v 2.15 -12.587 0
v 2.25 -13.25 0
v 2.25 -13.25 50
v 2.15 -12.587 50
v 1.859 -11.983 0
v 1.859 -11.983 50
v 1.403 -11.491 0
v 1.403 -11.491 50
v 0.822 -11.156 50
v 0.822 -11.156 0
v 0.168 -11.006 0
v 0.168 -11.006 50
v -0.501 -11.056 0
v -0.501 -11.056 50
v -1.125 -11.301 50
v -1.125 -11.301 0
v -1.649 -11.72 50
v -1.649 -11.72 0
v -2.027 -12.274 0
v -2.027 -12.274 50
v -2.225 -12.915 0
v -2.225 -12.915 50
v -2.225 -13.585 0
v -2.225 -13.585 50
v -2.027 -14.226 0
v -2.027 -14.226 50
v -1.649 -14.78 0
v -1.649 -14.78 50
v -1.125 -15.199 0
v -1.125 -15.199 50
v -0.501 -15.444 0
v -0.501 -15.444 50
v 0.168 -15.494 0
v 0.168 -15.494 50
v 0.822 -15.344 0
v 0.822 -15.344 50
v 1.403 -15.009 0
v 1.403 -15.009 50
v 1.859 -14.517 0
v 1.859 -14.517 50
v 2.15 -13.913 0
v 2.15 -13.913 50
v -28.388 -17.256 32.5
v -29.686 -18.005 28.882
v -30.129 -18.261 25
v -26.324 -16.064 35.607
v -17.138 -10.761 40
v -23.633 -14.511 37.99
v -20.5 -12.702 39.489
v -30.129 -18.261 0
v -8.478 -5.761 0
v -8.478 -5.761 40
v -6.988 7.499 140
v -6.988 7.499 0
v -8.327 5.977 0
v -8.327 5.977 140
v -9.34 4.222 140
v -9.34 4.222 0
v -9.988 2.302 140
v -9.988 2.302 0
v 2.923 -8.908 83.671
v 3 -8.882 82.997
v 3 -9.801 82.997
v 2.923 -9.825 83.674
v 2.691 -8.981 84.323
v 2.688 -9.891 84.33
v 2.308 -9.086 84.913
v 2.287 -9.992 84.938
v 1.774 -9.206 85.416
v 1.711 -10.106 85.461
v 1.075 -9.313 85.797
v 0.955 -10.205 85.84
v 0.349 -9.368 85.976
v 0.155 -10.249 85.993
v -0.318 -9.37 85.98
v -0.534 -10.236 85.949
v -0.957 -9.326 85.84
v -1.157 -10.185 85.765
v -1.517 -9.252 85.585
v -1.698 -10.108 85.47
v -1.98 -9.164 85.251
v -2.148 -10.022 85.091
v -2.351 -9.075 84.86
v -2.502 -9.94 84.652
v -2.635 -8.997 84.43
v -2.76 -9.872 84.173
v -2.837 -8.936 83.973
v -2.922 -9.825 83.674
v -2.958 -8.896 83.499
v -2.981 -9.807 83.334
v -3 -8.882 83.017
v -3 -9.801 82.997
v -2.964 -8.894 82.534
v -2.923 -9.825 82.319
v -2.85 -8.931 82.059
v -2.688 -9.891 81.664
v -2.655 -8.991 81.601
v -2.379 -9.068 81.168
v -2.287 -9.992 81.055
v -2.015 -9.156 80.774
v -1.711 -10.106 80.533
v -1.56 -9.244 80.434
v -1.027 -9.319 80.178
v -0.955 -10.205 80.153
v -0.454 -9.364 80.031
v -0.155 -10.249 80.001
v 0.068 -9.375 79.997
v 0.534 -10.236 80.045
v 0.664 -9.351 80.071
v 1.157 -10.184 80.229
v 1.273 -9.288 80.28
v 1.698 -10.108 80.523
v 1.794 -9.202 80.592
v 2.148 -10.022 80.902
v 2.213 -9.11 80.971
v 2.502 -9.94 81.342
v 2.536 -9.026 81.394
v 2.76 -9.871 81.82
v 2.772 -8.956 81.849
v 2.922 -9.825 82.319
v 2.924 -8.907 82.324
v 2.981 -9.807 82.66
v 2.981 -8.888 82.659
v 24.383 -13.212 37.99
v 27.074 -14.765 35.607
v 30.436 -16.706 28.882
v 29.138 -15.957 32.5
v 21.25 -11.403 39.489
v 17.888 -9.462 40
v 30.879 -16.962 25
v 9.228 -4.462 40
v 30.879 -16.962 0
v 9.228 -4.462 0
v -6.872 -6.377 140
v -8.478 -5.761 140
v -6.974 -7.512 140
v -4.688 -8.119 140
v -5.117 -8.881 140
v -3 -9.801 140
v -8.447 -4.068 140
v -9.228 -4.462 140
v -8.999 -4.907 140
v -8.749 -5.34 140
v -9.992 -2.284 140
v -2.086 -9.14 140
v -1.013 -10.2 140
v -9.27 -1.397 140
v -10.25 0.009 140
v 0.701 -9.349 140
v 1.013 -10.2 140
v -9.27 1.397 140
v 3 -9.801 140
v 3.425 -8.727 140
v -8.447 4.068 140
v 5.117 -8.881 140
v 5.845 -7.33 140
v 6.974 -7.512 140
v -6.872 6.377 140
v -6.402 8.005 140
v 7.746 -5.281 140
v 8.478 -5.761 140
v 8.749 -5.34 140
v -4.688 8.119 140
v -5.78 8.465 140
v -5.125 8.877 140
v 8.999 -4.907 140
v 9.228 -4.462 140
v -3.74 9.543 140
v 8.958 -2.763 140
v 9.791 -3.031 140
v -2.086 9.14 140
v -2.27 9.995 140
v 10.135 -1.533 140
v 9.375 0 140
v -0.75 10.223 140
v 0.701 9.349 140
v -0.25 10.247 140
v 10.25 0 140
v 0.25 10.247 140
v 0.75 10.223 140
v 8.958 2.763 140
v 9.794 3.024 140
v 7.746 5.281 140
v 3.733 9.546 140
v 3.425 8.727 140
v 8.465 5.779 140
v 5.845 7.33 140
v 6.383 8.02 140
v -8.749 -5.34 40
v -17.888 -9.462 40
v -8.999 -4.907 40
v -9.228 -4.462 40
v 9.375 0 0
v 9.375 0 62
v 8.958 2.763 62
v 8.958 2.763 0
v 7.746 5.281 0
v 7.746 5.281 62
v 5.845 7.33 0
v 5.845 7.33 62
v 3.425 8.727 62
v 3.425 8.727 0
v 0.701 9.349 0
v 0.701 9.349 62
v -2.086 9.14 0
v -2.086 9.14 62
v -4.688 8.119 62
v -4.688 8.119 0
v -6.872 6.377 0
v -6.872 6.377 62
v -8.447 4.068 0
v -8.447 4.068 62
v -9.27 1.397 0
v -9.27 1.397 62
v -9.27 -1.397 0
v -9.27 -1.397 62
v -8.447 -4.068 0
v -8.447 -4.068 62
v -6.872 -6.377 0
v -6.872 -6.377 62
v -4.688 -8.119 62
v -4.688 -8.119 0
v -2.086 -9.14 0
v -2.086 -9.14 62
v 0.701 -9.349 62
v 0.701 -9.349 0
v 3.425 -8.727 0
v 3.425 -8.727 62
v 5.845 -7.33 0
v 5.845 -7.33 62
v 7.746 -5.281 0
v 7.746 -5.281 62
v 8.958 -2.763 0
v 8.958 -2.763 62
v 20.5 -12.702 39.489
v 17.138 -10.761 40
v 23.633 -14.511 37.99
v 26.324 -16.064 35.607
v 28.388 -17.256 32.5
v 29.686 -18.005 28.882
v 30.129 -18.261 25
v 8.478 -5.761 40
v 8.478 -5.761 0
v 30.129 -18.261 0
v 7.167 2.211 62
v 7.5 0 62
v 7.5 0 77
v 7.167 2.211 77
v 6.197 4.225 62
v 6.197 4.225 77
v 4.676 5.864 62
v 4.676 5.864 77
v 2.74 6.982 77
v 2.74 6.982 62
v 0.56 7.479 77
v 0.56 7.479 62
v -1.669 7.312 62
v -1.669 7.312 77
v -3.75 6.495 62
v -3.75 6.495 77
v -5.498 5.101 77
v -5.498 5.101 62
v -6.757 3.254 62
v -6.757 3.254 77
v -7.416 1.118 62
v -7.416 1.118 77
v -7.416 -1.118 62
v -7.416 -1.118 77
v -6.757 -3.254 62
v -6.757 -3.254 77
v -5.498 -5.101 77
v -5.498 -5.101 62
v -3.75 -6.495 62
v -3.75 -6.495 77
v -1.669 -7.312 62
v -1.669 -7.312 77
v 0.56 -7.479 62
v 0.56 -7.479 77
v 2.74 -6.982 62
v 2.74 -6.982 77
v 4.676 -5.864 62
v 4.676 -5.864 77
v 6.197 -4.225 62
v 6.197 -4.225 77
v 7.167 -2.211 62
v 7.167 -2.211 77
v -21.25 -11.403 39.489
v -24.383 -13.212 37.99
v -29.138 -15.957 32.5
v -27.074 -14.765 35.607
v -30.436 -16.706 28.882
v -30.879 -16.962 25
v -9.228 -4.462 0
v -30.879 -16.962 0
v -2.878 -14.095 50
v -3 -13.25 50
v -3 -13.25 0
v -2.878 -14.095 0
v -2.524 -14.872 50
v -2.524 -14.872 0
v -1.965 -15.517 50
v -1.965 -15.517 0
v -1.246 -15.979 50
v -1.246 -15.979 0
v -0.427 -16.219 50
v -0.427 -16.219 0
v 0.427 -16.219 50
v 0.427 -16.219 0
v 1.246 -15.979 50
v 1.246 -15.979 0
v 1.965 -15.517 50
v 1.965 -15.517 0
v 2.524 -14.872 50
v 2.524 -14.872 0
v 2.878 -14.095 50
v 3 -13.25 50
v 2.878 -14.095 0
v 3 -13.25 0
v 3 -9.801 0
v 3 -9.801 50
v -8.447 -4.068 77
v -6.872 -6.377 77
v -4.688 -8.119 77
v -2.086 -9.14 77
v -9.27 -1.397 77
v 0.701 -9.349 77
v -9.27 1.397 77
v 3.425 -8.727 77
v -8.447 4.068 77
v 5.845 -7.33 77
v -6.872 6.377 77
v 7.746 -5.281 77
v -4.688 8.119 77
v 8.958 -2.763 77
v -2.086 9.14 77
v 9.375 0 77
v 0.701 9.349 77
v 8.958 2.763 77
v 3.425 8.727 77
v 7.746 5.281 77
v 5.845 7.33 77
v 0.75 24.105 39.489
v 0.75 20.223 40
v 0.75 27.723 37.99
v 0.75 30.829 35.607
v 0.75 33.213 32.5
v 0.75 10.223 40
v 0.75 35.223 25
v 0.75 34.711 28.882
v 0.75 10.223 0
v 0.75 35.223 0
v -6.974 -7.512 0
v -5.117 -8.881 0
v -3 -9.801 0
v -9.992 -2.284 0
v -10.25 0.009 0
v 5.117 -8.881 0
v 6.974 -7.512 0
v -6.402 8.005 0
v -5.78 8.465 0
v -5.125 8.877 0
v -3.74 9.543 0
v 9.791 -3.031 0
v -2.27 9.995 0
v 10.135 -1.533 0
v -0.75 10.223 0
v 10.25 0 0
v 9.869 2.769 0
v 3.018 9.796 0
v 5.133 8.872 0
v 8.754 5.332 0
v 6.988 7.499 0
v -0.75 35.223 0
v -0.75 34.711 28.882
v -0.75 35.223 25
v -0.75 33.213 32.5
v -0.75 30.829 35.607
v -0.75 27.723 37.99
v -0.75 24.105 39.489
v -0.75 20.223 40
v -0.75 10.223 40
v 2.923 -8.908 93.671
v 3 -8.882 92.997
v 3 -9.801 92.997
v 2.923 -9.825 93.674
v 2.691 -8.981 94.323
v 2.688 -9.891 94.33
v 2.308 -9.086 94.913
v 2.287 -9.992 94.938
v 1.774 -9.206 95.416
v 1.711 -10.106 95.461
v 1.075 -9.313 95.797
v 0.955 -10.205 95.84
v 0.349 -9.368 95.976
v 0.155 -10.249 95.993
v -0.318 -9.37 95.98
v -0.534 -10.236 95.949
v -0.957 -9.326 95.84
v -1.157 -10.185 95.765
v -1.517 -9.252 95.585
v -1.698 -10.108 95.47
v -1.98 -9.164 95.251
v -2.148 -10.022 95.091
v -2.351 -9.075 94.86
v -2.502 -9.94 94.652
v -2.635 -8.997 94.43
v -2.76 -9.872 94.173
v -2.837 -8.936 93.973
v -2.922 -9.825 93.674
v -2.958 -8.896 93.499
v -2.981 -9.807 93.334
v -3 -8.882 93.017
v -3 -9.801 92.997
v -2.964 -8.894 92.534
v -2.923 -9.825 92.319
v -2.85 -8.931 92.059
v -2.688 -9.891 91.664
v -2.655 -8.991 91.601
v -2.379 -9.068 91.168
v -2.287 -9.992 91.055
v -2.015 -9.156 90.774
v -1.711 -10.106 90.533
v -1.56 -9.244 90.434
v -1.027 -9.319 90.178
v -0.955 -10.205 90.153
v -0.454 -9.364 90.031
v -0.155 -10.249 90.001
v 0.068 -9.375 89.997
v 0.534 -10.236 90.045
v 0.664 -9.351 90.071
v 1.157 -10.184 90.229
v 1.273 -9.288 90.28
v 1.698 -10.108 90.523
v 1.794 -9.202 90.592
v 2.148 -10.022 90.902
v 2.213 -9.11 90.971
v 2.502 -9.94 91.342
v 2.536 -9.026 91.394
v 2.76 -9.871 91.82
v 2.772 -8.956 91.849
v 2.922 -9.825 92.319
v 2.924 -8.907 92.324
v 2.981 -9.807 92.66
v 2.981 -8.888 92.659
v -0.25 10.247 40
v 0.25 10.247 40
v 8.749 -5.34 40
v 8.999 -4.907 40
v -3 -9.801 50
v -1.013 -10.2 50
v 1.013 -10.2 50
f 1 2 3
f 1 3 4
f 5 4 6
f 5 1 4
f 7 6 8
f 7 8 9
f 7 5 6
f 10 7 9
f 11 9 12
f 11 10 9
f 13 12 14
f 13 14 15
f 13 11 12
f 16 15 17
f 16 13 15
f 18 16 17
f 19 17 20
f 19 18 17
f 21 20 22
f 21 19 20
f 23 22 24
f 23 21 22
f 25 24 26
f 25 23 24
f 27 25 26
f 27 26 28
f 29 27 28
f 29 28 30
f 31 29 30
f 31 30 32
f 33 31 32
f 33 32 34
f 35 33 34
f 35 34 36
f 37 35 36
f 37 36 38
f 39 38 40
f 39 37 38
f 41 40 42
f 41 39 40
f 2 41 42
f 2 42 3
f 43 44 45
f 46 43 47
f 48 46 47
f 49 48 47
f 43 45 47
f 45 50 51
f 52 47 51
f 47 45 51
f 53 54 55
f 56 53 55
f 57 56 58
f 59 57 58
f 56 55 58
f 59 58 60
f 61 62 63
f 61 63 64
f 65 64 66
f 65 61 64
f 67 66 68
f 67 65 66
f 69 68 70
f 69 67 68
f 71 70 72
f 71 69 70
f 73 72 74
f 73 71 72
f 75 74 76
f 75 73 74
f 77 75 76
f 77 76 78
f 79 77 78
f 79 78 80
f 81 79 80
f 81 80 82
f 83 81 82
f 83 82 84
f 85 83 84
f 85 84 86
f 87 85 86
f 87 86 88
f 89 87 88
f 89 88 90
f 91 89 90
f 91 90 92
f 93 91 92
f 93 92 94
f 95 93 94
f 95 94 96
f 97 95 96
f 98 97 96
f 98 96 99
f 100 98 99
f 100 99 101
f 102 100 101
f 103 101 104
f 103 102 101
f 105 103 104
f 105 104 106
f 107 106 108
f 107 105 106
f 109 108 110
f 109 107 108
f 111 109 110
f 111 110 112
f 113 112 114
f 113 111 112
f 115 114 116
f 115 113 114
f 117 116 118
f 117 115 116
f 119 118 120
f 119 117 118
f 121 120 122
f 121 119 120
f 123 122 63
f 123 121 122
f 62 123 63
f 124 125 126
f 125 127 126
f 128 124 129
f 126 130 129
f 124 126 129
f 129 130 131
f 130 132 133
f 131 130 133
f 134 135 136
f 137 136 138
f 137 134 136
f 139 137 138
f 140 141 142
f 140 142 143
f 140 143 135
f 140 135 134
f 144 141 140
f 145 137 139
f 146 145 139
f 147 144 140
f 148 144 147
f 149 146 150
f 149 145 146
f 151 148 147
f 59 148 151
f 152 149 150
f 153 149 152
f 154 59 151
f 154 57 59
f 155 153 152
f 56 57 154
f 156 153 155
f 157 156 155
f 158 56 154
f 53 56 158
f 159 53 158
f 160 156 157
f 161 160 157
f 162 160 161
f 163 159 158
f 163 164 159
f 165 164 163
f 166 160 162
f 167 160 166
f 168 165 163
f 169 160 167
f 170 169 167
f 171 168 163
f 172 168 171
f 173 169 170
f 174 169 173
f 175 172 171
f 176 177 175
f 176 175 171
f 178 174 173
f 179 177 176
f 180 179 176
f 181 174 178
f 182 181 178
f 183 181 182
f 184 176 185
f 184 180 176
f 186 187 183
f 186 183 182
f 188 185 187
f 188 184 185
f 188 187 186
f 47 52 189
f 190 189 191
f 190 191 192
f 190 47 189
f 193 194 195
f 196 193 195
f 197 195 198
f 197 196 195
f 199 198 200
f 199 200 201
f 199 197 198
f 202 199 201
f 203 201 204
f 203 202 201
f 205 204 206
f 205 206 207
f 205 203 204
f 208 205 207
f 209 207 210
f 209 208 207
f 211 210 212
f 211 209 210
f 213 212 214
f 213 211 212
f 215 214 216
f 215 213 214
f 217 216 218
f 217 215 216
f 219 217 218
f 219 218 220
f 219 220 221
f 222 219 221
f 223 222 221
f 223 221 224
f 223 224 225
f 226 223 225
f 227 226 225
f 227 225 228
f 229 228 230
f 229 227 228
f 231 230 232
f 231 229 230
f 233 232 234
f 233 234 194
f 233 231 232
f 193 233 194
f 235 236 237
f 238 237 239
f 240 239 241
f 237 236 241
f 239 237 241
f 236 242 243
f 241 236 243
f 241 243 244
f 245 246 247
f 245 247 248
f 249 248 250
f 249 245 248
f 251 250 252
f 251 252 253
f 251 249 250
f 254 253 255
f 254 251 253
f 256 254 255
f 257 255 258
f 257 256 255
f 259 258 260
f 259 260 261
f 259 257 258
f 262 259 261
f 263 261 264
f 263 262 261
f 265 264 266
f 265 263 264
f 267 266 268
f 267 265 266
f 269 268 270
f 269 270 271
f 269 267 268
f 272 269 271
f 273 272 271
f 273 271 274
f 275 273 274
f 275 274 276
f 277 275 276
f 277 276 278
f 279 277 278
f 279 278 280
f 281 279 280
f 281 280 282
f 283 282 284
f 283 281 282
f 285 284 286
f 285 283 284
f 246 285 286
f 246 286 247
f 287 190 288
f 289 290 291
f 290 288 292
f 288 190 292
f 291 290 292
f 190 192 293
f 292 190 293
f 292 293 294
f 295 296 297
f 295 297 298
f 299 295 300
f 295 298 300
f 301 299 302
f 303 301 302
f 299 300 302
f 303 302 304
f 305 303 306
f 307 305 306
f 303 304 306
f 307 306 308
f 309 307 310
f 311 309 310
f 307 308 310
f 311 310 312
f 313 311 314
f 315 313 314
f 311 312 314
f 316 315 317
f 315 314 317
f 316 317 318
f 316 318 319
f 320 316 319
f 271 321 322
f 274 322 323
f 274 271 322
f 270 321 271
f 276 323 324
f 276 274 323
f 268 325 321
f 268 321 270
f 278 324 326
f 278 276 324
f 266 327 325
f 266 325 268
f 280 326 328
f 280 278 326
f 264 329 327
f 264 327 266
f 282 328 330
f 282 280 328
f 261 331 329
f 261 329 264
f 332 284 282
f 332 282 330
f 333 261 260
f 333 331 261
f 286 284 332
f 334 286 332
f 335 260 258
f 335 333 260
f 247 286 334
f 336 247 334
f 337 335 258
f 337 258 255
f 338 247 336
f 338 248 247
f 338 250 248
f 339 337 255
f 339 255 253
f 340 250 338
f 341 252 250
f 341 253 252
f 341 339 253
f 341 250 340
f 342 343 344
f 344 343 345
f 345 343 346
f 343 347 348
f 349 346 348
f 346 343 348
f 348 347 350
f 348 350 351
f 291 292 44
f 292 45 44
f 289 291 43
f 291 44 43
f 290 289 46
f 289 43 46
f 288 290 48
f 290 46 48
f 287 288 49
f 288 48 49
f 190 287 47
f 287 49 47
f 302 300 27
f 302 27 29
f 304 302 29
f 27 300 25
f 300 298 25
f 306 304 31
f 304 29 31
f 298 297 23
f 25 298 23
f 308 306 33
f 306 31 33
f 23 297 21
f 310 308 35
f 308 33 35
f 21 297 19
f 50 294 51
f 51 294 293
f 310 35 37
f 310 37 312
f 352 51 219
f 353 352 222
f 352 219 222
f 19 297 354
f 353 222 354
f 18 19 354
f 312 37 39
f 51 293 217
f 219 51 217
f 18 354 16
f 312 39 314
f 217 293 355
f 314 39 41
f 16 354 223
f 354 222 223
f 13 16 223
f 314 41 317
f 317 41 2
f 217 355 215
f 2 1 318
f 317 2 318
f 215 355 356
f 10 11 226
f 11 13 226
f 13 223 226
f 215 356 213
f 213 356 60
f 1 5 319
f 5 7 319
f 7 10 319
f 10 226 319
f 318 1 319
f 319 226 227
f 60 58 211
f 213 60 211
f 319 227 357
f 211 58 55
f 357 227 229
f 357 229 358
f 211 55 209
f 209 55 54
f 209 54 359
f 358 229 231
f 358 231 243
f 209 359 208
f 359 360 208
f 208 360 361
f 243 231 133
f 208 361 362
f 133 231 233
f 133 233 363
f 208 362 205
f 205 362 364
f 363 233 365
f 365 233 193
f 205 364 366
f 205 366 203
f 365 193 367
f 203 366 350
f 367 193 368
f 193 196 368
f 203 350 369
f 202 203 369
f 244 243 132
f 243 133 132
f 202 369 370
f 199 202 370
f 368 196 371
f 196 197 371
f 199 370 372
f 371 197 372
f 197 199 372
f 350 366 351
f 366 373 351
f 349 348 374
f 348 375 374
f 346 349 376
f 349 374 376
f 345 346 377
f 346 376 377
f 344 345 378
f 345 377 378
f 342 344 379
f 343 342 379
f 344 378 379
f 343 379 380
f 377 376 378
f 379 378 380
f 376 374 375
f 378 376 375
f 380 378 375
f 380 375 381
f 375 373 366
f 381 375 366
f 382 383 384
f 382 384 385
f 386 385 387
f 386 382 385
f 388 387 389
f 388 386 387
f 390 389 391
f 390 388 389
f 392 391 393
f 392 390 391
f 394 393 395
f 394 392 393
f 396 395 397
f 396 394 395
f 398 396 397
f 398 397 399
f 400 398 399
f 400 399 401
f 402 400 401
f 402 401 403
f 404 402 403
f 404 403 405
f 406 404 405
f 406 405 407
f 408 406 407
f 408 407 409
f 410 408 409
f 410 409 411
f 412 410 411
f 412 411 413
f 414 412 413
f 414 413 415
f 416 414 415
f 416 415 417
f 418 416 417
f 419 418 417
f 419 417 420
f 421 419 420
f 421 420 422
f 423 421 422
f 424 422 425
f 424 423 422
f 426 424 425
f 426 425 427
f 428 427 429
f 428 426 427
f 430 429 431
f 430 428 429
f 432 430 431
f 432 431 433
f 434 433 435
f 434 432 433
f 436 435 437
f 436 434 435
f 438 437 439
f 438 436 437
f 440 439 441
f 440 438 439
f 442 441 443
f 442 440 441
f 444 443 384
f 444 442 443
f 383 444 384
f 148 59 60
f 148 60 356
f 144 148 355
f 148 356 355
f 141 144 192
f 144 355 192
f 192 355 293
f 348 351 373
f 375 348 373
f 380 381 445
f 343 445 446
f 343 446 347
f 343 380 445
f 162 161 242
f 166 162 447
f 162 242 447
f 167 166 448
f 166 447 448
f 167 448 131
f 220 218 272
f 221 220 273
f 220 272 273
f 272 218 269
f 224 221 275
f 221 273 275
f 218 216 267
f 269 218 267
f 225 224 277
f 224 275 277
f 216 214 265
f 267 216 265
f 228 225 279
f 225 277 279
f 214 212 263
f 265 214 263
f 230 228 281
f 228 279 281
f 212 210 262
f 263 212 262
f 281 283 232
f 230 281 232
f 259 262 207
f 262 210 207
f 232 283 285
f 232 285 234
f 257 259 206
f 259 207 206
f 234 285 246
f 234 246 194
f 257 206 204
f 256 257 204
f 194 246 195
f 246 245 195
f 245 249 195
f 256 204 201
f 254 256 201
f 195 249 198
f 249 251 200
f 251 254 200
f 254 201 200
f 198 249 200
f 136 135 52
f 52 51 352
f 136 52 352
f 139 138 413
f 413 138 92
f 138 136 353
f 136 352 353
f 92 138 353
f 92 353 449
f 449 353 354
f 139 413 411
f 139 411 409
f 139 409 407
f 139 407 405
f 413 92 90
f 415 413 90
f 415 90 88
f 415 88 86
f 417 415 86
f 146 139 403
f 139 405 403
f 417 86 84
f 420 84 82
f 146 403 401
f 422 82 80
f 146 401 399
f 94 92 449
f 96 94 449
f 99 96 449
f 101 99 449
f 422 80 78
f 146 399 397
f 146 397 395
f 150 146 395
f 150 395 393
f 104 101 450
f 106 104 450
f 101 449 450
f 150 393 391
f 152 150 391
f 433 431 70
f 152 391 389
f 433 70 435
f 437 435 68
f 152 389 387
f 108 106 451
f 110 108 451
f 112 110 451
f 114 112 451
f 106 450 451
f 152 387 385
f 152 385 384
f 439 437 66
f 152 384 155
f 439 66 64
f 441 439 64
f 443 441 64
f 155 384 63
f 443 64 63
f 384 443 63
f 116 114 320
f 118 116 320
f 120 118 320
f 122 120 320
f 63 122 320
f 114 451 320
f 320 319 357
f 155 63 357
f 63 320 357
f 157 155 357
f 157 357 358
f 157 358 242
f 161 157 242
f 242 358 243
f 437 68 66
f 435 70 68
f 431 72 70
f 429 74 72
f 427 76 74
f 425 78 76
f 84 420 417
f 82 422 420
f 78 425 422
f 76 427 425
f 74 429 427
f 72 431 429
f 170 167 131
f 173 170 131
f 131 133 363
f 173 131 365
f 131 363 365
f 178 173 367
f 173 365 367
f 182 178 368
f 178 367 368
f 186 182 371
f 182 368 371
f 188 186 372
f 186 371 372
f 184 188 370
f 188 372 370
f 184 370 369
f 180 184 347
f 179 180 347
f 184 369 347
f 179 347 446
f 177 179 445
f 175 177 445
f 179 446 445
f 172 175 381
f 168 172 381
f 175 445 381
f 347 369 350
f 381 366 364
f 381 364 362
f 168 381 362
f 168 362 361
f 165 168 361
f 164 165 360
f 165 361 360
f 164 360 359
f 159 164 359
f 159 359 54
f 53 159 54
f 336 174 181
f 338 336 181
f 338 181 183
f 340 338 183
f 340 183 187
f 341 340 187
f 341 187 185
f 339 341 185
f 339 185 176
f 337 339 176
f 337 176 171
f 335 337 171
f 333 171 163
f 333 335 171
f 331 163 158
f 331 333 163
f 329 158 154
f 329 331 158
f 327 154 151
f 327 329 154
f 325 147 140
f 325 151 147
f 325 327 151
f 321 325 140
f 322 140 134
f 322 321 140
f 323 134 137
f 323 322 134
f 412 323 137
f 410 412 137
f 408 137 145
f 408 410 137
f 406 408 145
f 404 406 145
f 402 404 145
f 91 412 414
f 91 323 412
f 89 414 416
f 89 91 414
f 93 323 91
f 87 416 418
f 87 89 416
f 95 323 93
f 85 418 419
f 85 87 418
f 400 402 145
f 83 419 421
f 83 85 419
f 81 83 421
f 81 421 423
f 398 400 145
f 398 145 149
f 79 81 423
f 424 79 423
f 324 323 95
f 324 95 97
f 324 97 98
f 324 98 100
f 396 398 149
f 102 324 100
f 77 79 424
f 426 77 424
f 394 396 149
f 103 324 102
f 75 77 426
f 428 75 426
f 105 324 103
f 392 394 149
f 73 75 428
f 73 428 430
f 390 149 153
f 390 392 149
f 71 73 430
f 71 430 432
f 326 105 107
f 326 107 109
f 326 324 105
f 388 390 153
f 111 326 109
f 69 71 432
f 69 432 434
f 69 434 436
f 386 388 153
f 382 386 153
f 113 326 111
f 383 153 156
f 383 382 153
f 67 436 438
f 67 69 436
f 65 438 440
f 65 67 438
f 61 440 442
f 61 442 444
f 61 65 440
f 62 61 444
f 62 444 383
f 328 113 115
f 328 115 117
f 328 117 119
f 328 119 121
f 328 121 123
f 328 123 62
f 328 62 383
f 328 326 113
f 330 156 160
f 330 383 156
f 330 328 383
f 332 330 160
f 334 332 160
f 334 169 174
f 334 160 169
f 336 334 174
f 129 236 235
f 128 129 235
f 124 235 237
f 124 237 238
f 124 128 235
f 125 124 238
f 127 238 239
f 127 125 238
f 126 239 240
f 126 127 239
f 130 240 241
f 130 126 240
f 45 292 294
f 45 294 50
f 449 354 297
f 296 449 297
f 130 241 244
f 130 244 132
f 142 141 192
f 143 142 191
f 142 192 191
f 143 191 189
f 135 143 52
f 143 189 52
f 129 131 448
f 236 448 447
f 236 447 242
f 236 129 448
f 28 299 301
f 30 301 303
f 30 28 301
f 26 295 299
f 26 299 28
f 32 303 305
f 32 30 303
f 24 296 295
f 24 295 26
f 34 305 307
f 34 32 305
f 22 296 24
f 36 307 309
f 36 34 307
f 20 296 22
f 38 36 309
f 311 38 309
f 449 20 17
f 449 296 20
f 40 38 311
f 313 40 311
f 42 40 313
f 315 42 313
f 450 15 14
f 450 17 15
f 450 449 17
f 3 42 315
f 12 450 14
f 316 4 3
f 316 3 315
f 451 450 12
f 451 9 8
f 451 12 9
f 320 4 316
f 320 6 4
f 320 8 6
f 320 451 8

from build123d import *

# Parameters (mm, degrees)
F0_R     = 9.375
F1_DEPTH = 140
F2_DEPTH = 40
F3_COUNT = 3
F0_R_2   = 2.25
F4_DEPTH = 50
F5_START = 62
F0_R_3   = 7.5
F5_DEPTH = 15
F6_R     = 3
F7_DEPTH = 25
F8_R     = 15


with BuildPart() as f1:
    # F0 (on Top) → F1 (new body)
    with BuildSketch(Plane.XY):
        with BuildLine():
            ThreePointArc((3, -9.801147892), (8.2405248619, -6.0955926701), (10.25, 0))
            ThreePointArc((10.25, 0), (7.5083287088, 6.9776428685), (0.75, 10.2225241501))
            ThreePointArc((0.75, 10.2225241501), (0, 10.25), (-0.75, 10.2225241501))
            ThreePointArc((-0.75, 10.2225241501), (-10.185896402, 1.1445586432), (-3, -9.801147892))
            ThreePointArc((-3, -9.801147892), (-1.5166961062, -10.1371659216), (-1.65e-08, -10.25))
            ThreePointArc((-1.65e-08, -10.25), (1.5166960899, -10.137165924), (3, -9.801147892))
        make_face()
        Circle(F0_R, mode=Mode.SUBTRACT)
    extrude(amount=F1_DEPTH)

    # F0 (on Top) → F2 (join)
    with BuildSketch(Plane.XY):
        with BuildLine():
            ThreePointArc((-0.75, 10.2225241501), (0, 10.25), (0.75, 10.2225241501))
            Line((0.75, 10.2225241501), (0.75, 35.2225241501))
            Line((0.75, 35.2225241501), (-0.75, 35.2225241501))
            Line((-0.75, 35.2225241501), (-0.75, 10.2225241501))
        make_face()
    extrude(amount=F2_DEPTH)


with BuildPart() as f3_1:
    # F3: instance of F1
    add(f1.part.rotate(Axis((0, 0, 140), (0, 0, 1)), 1 * 360 / F3_COUNT))


with BuildPart() as f3_2:
    # F3: instance of F1
    add(f1.part.rotate(Axis((0, 0, 140), (0, 0, 1)), 2 * 360 / F3_COUNT))


with BuildPart() as f1_1:
    add(f1.part)

    add(f3_1.part)  # F4 merges F3_1

    add(f3_2.part)  # F4 merges F3_2
    # F0 (on Top) → F4 (join)
    with BuildSketch(Plane.XY):
        with BuildLine():
            ThreePointArc((3, -13.25), (2.1213203377, -11.1286796506), (-1.65e-08, -10.25))
            ThreePointArc((-1.65e-08, -10.25), (-2.1213203494, -11.1286796623), (-3, -13.25))
            ThreePointArc((-3, -13.25), (0, -16.25), (3, -13.25))
        make_face()
        with Locations((0, -13.25)):
            Circle(F0_R_2, mode=Mode.SUBTRACT)
        with BuildLine():
            Line((3, -13.25), (3, -9.801147892))
            ThreePointArc((3, -9.801147892), (1.5166960899, -10.137165924), (-1.65e-08, -10.25))
            ThreePointArc((-1.65e-08, -10.25), (2.1213203377, -11.1286796506), (3, -13.25))
        make_face()
        with BuildLine():
            ThreePointArc((-3, -13.25), (-2.1213203494, -11.1286796623), (-1.65e-08, -10.25))
            ThreePointArc((-1.65e-08, -10.25), (-1.5166961062, -10.1371659216), (-3, -9.801147892))
            Line((-3, -9.801147892), (-3, -13.25))
        make_face()
    extrude(amount=F4_DEPTH)

    # F0 (on Top) → F5 (join)
    with BuildSketch(Plane.XY.offset(F5_START)):
        Circle(F0_R)
        Circle(F0_R_3, mode=Mode.SUBTRACT)
    extrude(amount=F5_DEPTH)

    # F6 (on Front) → F7 (cut)
    with BuildSketch(Plane.XZ):
        with Locations((0, 82.9966113766)):
            Circle(F6_R)
        with Locations((0, 92.9966113766)):
            Circle(F6_R)
    extrude(amount=F7_DEPTH, mode=Mode.SUBTRACT)

    # F8
    f8_edges = [f1_1.edges().sort_by_distance(p)[0] for p in [
        (0, 35.222524, 40),
        (30.503601, -17.611262, 40),
        (-30.503601, -17.611262, 40),
    ]]
    fillet(f8_edges, radius=F8_R)


solid = f1_1.part
